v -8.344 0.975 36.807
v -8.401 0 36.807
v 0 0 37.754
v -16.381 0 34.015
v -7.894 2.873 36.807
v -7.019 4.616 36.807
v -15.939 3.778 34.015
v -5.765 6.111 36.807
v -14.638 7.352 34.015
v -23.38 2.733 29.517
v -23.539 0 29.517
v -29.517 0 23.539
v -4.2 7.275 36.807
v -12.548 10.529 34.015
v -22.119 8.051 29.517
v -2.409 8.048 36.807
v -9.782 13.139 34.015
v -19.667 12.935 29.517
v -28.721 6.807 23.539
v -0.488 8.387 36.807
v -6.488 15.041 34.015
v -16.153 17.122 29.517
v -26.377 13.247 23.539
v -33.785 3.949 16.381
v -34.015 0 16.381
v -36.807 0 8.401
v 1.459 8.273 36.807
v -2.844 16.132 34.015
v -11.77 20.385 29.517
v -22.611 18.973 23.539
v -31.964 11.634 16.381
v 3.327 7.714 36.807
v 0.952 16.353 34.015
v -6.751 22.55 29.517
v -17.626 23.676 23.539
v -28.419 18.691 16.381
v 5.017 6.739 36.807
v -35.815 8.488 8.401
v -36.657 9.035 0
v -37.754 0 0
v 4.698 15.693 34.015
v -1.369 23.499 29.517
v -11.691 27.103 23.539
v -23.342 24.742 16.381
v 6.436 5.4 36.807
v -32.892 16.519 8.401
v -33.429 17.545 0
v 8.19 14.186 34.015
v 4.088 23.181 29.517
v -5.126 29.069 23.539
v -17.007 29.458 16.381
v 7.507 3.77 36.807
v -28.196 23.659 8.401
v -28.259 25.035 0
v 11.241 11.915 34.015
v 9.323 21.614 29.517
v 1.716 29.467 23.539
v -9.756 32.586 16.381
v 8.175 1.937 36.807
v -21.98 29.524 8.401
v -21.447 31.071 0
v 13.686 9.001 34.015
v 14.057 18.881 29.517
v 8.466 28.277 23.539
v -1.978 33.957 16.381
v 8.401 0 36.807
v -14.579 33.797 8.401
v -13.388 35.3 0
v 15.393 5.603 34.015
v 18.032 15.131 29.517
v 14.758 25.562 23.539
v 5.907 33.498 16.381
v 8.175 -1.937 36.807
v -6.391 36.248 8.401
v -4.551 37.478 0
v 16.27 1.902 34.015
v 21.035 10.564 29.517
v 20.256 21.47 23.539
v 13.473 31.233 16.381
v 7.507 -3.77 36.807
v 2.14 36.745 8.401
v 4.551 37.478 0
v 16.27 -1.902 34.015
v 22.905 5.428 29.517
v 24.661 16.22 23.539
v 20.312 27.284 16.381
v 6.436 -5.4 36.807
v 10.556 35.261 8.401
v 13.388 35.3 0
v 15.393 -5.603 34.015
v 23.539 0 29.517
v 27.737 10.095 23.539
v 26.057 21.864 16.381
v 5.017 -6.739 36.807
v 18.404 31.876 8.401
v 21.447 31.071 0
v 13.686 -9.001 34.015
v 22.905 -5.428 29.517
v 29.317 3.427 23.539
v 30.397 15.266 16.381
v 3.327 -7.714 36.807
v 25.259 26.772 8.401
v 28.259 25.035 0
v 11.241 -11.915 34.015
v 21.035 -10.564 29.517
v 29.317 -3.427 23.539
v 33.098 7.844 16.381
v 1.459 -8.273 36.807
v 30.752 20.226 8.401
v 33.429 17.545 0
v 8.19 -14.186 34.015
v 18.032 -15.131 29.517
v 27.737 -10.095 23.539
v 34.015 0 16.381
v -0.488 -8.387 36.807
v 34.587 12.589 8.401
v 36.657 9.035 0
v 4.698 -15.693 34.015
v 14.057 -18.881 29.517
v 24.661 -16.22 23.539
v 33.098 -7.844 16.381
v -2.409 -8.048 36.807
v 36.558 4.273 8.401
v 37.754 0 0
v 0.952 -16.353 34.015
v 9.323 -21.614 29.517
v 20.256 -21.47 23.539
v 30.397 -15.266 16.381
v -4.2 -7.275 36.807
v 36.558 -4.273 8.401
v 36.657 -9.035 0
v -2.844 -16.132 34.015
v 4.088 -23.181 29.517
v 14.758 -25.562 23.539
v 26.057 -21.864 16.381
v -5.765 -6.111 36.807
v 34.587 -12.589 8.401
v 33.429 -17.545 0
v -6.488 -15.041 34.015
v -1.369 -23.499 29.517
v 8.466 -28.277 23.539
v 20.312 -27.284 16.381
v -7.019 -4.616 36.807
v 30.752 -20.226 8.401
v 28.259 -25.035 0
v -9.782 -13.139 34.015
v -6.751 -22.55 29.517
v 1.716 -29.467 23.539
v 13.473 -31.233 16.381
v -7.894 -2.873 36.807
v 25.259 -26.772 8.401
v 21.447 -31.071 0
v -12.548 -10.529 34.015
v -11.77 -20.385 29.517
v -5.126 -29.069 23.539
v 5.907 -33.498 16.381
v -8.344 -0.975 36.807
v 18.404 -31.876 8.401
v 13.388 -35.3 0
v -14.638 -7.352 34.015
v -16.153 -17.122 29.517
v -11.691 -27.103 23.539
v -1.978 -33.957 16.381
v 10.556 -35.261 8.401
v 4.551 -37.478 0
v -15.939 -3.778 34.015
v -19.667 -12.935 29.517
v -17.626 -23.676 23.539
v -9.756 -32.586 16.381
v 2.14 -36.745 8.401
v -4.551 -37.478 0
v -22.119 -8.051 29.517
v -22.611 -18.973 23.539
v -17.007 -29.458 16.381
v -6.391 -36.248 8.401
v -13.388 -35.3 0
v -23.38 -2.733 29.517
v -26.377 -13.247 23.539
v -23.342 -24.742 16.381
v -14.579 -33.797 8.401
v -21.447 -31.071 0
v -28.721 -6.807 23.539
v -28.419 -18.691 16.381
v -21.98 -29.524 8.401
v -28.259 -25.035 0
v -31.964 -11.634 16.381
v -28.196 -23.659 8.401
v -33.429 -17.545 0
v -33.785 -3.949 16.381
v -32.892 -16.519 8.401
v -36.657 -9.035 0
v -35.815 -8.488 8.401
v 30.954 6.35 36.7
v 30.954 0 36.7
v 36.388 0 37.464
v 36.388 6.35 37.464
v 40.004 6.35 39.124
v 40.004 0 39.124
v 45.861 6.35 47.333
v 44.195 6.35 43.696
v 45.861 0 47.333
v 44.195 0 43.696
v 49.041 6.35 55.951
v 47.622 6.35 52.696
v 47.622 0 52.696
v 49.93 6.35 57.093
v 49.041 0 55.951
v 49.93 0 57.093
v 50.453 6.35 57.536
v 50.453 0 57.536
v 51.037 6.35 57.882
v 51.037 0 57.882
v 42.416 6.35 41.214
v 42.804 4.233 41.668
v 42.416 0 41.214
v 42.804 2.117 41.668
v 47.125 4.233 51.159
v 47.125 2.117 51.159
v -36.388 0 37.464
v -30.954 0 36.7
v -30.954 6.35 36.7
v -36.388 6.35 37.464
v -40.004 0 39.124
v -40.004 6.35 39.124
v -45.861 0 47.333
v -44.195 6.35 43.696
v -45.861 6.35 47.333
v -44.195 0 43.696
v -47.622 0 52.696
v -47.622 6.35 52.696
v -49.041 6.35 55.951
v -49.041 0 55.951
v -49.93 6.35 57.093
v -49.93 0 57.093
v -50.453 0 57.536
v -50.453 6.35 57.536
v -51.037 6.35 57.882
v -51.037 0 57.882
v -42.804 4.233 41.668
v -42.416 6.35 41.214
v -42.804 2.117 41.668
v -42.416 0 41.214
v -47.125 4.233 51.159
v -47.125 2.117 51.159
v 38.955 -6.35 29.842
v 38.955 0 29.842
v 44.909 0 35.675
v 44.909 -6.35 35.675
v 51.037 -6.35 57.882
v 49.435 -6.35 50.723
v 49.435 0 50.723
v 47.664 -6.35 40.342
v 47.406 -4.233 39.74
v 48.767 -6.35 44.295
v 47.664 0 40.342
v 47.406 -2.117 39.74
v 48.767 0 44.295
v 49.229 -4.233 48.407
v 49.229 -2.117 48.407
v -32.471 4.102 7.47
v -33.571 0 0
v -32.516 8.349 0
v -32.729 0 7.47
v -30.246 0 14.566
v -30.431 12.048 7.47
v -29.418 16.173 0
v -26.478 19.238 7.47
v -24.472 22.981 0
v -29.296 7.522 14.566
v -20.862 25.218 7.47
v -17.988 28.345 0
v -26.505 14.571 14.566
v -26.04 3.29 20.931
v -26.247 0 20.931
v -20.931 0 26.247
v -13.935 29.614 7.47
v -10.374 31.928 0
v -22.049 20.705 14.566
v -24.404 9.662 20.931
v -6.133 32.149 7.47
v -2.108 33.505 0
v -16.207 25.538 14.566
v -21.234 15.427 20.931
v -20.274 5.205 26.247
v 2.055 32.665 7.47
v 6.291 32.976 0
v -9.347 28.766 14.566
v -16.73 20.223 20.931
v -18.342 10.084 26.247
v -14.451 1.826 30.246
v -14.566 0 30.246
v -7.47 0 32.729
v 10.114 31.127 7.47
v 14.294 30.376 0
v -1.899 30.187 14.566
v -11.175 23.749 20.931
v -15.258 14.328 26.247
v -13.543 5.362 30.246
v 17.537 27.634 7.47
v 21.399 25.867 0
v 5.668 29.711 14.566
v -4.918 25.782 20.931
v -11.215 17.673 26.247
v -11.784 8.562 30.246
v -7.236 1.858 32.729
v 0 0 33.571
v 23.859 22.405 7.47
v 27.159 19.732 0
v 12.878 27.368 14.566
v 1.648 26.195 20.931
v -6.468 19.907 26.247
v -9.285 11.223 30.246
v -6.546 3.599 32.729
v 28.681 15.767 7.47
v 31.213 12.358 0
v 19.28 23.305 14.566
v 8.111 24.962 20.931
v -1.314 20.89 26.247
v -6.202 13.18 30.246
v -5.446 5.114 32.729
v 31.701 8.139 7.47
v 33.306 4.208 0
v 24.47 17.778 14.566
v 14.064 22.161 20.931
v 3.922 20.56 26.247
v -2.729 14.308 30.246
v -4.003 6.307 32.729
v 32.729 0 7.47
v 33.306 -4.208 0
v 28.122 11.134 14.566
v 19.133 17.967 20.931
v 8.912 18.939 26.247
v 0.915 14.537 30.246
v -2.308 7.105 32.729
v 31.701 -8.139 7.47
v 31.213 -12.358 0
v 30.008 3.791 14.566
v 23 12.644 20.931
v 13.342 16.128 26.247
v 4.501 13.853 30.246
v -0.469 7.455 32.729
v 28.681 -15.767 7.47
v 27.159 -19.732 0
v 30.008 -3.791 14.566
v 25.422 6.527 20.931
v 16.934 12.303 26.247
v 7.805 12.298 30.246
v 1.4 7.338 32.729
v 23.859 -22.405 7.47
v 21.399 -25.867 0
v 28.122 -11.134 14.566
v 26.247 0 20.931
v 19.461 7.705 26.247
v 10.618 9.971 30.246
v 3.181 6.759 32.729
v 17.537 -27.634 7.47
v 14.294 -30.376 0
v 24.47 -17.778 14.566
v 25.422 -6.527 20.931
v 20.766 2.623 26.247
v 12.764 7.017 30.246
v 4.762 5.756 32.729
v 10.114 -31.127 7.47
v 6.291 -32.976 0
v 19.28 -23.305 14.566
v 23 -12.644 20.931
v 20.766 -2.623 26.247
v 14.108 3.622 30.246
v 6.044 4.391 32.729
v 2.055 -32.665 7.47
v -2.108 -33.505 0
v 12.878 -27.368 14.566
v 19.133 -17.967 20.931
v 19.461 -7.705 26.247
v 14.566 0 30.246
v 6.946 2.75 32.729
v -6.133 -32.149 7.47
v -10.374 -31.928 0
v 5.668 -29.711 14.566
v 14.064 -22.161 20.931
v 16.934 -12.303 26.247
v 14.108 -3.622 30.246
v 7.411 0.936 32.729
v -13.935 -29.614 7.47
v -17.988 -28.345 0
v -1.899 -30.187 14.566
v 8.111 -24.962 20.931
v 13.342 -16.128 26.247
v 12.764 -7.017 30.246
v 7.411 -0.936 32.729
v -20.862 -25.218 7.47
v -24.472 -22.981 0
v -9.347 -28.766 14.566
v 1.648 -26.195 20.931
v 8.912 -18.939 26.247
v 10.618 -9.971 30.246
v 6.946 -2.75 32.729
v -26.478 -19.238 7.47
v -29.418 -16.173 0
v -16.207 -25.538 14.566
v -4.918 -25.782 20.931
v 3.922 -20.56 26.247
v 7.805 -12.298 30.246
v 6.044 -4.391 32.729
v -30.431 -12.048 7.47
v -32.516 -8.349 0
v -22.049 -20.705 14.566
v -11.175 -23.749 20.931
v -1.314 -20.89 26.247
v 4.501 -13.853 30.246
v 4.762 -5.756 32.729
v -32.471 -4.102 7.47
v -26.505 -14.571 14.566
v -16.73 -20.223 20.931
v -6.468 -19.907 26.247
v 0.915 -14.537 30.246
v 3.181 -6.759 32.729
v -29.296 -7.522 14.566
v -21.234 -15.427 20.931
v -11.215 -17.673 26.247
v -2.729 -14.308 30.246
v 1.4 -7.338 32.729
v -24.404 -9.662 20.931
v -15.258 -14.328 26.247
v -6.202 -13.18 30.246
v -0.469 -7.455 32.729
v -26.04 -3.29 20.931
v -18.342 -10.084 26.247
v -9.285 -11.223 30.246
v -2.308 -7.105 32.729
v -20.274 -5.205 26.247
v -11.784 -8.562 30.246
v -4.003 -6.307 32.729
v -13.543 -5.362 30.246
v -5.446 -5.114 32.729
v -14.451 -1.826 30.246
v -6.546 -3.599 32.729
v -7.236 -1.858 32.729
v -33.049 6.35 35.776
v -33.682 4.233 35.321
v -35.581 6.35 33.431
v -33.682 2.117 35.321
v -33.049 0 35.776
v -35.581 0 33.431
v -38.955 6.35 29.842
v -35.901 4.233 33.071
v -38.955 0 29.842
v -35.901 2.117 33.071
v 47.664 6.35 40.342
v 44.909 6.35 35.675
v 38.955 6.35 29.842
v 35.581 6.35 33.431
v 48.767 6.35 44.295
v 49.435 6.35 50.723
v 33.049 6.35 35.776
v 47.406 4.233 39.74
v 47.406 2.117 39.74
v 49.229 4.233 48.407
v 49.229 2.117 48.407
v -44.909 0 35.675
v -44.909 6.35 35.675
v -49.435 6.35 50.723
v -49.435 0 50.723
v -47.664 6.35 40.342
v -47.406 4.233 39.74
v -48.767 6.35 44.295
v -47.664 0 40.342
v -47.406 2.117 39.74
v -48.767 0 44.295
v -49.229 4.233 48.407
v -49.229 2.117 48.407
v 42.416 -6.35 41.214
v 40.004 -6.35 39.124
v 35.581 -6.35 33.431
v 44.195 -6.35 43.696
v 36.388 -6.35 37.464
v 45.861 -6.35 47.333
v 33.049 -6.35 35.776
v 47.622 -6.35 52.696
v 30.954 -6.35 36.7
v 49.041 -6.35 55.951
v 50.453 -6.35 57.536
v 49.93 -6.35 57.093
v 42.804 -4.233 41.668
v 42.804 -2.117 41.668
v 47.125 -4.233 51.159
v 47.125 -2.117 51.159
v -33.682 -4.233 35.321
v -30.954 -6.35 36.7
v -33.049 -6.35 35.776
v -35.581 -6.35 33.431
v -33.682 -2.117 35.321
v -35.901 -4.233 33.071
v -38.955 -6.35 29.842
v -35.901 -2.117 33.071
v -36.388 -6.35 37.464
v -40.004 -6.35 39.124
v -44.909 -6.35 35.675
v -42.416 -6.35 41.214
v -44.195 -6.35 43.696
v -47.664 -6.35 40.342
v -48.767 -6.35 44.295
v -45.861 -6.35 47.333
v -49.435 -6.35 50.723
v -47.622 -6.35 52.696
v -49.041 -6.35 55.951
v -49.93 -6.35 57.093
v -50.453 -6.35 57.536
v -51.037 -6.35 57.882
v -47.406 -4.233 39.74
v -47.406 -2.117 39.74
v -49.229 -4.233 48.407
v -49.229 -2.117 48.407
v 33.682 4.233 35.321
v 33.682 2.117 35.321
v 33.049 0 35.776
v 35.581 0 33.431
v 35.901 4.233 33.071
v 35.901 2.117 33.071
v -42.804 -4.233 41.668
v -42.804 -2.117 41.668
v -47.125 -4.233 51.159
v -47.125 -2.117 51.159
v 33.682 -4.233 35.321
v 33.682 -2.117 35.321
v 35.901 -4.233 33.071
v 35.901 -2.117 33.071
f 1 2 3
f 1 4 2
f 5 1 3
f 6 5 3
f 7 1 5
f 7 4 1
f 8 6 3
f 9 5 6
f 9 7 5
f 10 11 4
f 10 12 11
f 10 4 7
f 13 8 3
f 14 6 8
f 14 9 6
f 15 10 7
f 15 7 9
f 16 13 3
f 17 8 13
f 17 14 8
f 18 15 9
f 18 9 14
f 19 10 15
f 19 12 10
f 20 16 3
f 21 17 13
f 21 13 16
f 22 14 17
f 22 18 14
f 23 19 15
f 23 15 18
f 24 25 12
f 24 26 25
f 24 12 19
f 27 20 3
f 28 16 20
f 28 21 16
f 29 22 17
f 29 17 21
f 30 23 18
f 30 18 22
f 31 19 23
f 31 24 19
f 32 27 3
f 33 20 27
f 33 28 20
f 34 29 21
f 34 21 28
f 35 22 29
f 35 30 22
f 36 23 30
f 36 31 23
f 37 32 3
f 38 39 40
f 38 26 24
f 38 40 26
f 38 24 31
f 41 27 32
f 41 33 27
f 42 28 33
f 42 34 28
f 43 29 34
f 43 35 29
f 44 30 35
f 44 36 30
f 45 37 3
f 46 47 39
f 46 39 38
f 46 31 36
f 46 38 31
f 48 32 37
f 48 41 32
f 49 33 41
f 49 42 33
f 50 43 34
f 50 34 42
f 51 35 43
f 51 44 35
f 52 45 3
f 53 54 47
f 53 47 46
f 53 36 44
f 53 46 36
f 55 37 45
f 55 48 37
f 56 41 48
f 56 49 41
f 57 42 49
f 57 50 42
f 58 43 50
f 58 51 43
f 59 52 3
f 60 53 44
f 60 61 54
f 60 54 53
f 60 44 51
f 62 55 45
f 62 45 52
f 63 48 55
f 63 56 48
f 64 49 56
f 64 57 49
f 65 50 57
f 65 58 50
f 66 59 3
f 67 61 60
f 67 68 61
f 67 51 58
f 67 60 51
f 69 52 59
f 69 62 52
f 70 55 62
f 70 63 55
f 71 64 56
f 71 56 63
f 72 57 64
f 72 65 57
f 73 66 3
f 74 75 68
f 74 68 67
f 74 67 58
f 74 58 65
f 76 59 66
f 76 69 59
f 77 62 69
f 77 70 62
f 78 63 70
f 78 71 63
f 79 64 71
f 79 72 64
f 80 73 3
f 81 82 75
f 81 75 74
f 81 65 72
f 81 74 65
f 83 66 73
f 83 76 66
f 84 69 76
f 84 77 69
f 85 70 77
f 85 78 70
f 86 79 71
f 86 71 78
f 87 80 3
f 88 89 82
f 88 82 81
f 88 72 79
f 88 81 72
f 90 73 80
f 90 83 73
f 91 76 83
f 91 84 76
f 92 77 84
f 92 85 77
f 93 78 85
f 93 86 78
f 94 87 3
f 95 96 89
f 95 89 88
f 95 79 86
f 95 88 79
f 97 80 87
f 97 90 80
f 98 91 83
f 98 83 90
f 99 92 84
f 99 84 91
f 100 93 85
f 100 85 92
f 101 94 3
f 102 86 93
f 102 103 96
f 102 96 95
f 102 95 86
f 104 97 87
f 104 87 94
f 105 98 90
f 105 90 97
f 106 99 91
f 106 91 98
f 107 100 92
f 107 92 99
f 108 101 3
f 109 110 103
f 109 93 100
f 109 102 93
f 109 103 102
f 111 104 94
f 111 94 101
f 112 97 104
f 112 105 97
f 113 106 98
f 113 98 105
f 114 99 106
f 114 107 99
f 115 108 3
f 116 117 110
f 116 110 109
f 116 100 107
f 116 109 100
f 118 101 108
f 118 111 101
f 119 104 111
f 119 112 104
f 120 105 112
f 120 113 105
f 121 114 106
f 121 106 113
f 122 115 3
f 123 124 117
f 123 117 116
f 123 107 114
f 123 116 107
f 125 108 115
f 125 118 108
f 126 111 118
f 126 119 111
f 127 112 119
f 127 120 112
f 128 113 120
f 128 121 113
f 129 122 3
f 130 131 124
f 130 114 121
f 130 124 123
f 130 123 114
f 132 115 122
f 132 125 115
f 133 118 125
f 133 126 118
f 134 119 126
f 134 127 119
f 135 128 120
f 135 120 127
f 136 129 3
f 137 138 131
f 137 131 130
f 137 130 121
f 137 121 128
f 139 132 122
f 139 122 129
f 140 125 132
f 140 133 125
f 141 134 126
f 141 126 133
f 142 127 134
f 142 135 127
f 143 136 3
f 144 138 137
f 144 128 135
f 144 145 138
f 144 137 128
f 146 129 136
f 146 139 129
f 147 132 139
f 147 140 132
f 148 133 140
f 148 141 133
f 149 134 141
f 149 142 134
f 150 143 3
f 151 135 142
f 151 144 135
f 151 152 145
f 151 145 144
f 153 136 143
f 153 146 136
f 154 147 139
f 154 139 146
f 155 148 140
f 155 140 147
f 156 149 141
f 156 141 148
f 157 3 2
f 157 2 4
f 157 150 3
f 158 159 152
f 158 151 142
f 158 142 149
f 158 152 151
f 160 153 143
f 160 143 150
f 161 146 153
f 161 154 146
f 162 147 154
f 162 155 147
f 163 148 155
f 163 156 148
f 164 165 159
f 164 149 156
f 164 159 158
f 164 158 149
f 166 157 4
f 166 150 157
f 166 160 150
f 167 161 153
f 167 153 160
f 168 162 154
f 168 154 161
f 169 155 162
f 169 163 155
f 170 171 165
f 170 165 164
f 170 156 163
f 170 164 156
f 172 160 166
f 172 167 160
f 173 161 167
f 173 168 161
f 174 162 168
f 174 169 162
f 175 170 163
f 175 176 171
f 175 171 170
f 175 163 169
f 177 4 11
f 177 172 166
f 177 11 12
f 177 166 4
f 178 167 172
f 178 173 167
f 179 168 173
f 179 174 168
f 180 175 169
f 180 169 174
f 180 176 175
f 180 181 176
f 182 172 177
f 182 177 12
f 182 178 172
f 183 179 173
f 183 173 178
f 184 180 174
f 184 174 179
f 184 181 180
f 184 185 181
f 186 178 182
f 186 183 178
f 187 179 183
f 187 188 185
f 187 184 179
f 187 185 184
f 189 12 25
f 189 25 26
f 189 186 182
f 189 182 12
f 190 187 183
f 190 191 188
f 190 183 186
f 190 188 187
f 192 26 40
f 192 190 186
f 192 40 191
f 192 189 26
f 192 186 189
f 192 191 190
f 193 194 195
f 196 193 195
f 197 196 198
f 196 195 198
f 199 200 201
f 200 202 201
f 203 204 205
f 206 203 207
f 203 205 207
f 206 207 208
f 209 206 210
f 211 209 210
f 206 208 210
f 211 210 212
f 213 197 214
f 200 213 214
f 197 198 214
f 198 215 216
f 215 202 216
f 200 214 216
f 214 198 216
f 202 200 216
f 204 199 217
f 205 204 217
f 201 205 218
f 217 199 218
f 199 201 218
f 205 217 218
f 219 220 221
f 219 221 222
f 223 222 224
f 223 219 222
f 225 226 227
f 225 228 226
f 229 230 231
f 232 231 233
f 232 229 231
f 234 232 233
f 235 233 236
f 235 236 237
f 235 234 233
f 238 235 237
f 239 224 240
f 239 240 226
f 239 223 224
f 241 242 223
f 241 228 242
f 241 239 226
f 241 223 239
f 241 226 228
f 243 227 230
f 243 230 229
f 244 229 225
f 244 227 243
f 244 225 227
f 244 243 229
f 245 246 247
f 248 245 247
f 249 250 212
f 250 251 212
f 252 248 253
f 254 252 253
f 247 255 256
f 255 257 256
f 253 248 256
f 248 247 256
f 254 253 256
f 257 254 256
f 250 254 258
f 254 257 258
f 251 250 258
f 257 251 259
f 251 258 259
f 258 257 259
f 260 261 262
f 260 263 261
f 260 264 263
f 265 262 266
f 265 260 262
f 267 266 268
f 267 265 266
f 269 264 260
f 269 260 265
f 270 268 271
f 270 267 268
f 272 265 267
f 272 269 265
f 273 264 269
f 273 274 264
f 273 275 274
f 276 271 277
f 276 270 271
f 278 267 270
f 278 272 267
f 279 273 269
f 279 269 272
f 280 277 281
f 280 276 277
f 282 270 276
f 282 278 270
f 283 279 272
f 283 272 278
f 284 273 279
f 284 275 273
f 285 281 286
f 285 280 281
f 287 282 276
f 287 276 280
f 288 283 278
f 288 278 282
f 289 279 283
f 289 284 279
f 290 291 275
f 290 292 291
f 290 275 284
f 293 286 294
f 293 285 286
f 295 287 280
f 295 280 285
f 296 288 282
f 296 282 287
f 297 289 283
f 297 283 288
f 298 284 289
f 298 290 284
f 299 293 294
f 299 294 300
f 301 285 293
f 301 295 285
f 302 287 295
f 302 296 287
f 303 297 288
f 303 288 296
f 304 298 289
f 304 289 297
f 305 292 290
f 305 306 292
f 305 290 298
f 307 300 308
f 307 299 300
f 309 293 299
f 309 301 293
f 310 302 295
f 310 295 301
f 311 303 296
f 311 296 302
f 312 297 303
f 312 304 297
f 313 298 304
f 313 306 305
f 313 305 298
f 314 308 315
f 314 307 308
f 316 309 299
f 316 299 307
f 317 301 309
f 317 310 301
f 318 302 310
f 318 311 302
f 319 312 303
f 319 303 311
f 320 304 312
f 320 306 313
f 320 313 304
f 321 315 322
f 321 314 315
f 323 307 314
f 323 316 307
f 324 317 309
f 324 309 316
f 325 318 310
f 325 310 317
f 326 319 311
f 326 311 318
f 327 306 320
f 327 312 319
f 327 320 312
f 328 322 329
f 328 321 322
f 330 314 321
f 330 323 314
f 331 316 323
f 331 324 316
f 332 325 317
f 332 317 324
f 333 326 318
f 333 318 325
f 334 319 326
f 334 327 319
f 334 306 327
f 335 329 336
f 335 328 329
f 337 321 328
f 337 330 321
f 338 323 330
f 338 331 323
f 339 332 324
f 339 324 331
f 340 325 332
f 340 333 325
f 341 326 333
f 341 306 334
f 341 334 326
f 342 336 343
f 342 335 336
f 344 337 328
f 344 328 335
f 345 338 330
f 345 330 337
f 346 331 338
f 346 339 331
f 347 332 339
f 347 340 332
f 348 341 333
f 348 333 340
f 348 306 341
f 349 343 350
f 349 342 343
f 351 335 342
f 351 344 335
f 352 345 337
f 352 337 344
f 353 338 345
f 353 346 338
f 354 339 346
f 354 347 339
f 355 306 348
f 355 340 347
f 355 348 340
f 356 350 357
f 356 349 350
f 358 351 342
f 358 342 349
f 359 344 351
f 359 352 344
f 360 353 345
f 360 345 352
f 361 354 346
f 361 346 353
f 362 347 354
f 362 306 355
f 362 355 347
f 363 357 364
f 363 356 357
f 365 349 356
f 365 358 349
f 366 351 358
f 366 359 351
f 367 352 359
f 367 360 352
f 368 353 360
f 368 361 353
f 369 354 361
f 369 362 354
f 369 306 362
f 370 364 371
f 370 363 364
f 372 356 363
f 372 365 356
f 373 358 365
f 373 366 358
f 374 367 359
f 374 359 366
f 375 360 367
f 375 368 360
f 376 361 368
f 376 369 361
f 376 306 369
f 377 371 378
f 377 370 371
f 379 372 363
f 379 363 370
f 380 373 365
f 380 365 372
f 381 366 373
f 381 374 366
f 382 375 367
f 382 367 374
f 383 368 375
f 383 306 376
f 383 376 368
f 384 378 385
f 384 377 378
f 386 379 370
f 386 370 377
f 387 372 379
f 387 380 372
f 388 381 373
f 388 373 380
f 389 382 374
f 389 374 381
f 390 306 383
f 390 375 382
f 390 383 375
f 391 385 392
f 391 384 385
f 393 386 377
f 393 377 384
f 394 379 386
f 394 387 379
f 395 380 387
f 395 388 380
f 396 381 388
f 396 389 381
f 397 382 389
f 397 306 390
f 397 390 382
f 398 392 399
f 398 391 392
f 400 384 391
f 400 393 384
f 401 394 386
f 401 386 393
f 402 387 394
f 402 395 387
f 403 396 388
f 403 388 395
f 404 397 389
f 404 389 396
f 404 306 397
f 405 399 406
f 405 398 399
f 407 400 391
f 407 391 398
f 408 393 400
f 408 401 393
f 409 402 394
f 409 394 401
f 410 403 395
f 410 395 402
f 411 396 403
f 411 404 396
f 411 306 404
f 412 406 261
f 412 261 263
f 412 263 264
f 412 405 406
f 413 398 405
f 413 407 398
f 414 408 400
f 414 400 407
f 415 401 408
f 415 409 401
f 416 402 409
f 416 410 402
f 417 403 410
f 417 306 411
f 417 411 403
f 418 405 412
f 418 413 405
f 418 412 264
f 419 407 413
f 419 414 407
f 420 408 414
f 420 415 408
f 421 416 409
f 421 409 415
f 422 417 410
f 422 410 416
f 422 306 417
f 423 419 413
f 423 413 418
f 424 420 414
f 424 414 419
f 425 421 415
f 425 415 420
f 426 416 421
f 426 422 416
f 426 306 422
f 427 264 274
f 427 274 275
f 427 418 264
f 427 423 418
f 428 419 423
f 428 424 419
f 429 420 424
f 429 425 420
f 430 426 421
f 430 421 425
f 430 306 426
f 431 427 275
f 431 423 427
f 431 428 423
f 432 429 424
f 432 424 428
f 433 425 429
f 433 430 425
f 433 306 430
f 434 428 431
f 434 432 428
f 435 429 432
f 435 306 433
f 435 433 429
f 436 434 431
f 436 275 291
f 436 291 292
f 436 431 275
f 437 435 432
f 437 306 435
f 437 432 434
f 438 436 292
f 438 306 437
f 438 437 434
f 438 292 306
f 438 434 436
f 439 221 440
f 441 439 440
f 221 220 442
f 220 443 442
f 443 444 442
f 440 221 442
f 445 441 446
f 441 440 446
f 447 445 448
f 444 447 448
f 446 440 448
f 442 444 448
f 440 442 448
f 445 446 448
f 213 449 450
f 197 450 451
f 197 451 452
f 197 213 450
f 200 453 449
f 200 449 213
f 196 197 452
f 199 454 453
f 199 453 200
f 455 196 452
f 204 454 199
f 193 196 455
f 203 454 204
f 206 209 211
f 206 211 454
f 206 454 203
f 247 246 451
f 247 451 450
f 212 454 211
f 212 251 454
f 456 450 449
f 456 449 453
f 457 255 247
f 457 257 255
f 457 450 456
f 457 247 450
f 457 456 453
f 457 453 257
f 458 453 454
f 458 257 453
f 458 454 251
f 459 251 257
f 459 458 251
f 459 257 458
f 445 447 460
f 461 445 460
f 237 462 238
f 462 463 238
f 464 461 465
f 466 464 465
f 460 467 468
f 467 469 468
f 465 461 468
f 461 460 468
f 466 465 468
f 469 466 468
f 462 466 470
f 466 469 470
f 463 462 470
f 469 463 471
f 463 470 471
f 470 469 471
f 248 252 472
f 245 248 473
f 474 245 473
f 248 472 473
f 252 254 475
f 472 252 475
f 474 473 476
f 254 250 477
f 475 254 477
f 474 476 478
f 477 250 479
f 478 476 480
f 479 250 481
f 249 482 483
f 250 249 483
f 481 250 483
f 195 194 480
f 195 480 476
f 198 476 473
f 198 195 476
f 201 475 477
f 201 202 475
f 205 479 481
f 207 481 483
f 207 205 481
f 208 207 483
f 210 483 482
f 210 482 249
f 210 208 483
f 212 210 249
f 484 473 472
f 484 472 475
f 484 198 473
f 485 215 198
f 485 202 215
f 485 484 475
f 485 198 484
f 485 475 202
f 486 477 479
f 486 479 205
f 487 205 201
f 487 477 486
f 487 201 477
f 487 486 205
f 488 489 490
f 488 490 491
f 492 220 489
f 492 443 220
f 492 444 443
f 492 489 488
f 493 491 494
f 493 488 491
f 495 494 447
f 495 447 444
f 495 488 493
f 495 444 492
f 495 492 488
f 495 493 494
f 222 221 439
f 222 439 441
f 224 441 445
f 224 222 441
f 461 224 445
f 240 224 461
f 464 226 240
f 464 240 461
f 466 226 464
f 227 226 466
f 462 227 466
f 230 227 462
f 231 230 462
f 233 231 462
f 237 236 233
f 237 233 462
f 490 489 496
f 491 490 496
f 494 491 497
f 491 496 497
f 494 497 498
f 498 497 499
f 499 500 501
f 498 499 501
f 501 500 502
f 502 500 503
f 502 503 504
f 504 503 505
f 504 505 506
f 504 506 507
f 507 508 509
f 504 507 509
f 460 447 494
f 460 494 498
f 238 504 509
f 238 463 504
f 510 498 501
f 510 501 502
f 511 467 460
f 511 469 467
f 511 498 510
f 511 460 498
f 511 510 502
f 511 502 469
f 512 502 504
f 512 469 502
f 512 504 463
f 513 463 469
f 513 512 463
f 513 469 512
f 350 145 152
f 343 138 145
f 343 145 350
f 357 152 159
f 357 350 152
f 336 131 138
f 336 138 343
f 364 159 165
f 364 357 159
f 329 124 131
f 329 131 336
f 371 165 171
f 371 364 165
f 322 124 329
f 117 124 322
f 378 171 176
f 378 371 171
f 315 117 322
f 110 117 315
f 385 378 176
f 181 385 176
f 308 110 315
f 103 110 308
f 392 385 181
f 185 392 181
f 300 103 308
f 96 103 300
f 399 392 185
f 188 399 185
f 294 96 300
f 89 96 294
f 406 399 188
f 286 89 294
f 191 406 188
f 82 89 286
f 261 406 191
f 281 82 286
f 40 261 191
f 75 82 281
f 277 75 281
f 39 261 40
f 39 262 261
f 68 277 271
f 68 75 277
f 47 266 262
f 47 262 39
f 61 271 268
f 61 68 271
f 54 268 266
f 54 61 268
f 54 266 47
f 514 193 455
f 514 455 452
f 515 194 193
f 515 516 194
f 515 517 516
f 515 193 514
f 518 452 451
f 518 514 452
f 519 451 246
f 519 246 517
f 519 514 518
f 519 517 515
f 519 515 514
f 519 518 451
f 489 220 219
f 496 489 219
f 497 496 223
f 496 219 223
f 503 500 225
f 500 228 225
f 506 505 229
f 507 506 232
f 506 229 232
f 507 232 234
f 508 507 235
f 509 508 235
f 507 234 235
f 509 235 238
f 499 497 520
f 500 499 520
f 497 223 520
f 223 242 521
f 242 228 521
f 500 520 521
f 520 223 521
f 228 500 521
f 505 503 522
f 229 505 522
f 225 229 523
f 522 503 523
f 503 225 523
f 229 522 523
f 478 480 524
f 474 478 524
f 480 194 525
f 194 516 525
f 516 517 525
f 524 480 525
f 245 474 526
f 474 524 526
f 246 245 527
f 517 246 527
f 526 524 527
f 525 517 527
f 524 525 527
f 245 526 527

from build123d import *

# Parameters (mm, degrees)
F3_DEPTH = 6.35


# Not quite as in the source:
# - the program builds the solid bodies; features that only make, move or delete a surface that nothing else refers to are left out


with BuildPart() as f1:
    # F0 (on Front) → F1 (revolve)
    with BuildSketch(Plane.XZ):
        with BuildLine():
            Line((0, 33.5709042847), (0, 37.7536378801))
            ThreePointArc((0, 37.7536378801), (-26.6958533595, 26.6958533595), (-37.7536378801, 0))
            Line((-37.7536378801, 0), (-33.5709042847, 0))
            ThreePointArc((-33.5709042847, 0), (-23.7382140703, 23.7382140703), (0, 33.5709042847))
        make_face()
    revolve(axis=Axis((0, 0, 18.87681894), (0, 0, -1)))


with BuildPart() as f3:
    # F2 (on Front) → F3 (new body, symmetric)
    with BuildSketch(Plane.XZ):
        with BuildLine():
            add(Edge.make_bspline(
                [(30.9544112533, 36.6997048259), (48.9418655634, 36.9769893587), (44.9549630284, 54.9721755087), (51.0374158621, 57.8818283975)],
                knots=[0, 0, 0, 0, 29.1892006249, 29.1892006249, 29.1892006249, 29.1892006249], degree=3))
            add(Edge.make_bspline(
                [(30.9544112533, 36.6997048259), (34.3832373619, 35.7200428843), (35.0363478065, 33.5974358022), (38.9550067484, 29.842056334)],
                knots=[0, 0, 0, 0, 10.5374034332, 10.5374034332, 10.5374034332, 10.5374034332], degree=3))
            add(Edge.make_bspline(
                [(38.9550067484, 29.842056334), (52.9238283634, 41.034411639), (47.0328231653, 47.3239459097), (51.0374158621, 57.8818283975)],
                knots=[0, 0, 0, 0, 30.5321703677, 30.5321703677, 30.5321703677, 30.5321703677], degree=3))
        make_face()
    extrude(amount=F3_DEPTH, both=True)


with BuildPart() as f3b:
    # F2 (on Front) → F3, piece 2 (new body, symmetric)
    with BuildSketch(Plane.XZ):
        with BuildLine():
            add(Edge.make_bspline(
                [(-38.9550067484, 29.842056334), (-52.9238283634, 41.034411639), (-47.0328231653, 47.3239459097), (-51.0374158621, 57.8818283975)],
                knots=[0, 0, 0, 0, 30.5321703677, 30.5321703677, 30.5321703677, 30.5321703677], degree=3))
            add(Edge.make_bspline(
                [(-30.9544112533, 36.6997048259), (-34.3832373619, 35.7200428843), (-35.0363478065, 33.5974358022), (-38.9550067484, 29.842056334)],
                knots=[0, 0, 0, 0, 10.5374034332, 10.5374034332, 10.5374034332, 10.5374034332], degree=3))
            add(Edge.make_bspline(
                [(-30.9544112533, 36.6997048259), (-48.9418655634, 36.9769893587), (-44.9549630284, 54.9721755087), (-51.0374158621, 57.8818283975)],
                knots=[0, 0, 0, 0, 29.1892006249, 29.1892006249, 29.1892006249, 29.1892006249], degree=3))
        make_face()
    extrude(amount=F3_DEPTH, both=True)


solid = Compound([f1.part, f3.part, f3b.part])
